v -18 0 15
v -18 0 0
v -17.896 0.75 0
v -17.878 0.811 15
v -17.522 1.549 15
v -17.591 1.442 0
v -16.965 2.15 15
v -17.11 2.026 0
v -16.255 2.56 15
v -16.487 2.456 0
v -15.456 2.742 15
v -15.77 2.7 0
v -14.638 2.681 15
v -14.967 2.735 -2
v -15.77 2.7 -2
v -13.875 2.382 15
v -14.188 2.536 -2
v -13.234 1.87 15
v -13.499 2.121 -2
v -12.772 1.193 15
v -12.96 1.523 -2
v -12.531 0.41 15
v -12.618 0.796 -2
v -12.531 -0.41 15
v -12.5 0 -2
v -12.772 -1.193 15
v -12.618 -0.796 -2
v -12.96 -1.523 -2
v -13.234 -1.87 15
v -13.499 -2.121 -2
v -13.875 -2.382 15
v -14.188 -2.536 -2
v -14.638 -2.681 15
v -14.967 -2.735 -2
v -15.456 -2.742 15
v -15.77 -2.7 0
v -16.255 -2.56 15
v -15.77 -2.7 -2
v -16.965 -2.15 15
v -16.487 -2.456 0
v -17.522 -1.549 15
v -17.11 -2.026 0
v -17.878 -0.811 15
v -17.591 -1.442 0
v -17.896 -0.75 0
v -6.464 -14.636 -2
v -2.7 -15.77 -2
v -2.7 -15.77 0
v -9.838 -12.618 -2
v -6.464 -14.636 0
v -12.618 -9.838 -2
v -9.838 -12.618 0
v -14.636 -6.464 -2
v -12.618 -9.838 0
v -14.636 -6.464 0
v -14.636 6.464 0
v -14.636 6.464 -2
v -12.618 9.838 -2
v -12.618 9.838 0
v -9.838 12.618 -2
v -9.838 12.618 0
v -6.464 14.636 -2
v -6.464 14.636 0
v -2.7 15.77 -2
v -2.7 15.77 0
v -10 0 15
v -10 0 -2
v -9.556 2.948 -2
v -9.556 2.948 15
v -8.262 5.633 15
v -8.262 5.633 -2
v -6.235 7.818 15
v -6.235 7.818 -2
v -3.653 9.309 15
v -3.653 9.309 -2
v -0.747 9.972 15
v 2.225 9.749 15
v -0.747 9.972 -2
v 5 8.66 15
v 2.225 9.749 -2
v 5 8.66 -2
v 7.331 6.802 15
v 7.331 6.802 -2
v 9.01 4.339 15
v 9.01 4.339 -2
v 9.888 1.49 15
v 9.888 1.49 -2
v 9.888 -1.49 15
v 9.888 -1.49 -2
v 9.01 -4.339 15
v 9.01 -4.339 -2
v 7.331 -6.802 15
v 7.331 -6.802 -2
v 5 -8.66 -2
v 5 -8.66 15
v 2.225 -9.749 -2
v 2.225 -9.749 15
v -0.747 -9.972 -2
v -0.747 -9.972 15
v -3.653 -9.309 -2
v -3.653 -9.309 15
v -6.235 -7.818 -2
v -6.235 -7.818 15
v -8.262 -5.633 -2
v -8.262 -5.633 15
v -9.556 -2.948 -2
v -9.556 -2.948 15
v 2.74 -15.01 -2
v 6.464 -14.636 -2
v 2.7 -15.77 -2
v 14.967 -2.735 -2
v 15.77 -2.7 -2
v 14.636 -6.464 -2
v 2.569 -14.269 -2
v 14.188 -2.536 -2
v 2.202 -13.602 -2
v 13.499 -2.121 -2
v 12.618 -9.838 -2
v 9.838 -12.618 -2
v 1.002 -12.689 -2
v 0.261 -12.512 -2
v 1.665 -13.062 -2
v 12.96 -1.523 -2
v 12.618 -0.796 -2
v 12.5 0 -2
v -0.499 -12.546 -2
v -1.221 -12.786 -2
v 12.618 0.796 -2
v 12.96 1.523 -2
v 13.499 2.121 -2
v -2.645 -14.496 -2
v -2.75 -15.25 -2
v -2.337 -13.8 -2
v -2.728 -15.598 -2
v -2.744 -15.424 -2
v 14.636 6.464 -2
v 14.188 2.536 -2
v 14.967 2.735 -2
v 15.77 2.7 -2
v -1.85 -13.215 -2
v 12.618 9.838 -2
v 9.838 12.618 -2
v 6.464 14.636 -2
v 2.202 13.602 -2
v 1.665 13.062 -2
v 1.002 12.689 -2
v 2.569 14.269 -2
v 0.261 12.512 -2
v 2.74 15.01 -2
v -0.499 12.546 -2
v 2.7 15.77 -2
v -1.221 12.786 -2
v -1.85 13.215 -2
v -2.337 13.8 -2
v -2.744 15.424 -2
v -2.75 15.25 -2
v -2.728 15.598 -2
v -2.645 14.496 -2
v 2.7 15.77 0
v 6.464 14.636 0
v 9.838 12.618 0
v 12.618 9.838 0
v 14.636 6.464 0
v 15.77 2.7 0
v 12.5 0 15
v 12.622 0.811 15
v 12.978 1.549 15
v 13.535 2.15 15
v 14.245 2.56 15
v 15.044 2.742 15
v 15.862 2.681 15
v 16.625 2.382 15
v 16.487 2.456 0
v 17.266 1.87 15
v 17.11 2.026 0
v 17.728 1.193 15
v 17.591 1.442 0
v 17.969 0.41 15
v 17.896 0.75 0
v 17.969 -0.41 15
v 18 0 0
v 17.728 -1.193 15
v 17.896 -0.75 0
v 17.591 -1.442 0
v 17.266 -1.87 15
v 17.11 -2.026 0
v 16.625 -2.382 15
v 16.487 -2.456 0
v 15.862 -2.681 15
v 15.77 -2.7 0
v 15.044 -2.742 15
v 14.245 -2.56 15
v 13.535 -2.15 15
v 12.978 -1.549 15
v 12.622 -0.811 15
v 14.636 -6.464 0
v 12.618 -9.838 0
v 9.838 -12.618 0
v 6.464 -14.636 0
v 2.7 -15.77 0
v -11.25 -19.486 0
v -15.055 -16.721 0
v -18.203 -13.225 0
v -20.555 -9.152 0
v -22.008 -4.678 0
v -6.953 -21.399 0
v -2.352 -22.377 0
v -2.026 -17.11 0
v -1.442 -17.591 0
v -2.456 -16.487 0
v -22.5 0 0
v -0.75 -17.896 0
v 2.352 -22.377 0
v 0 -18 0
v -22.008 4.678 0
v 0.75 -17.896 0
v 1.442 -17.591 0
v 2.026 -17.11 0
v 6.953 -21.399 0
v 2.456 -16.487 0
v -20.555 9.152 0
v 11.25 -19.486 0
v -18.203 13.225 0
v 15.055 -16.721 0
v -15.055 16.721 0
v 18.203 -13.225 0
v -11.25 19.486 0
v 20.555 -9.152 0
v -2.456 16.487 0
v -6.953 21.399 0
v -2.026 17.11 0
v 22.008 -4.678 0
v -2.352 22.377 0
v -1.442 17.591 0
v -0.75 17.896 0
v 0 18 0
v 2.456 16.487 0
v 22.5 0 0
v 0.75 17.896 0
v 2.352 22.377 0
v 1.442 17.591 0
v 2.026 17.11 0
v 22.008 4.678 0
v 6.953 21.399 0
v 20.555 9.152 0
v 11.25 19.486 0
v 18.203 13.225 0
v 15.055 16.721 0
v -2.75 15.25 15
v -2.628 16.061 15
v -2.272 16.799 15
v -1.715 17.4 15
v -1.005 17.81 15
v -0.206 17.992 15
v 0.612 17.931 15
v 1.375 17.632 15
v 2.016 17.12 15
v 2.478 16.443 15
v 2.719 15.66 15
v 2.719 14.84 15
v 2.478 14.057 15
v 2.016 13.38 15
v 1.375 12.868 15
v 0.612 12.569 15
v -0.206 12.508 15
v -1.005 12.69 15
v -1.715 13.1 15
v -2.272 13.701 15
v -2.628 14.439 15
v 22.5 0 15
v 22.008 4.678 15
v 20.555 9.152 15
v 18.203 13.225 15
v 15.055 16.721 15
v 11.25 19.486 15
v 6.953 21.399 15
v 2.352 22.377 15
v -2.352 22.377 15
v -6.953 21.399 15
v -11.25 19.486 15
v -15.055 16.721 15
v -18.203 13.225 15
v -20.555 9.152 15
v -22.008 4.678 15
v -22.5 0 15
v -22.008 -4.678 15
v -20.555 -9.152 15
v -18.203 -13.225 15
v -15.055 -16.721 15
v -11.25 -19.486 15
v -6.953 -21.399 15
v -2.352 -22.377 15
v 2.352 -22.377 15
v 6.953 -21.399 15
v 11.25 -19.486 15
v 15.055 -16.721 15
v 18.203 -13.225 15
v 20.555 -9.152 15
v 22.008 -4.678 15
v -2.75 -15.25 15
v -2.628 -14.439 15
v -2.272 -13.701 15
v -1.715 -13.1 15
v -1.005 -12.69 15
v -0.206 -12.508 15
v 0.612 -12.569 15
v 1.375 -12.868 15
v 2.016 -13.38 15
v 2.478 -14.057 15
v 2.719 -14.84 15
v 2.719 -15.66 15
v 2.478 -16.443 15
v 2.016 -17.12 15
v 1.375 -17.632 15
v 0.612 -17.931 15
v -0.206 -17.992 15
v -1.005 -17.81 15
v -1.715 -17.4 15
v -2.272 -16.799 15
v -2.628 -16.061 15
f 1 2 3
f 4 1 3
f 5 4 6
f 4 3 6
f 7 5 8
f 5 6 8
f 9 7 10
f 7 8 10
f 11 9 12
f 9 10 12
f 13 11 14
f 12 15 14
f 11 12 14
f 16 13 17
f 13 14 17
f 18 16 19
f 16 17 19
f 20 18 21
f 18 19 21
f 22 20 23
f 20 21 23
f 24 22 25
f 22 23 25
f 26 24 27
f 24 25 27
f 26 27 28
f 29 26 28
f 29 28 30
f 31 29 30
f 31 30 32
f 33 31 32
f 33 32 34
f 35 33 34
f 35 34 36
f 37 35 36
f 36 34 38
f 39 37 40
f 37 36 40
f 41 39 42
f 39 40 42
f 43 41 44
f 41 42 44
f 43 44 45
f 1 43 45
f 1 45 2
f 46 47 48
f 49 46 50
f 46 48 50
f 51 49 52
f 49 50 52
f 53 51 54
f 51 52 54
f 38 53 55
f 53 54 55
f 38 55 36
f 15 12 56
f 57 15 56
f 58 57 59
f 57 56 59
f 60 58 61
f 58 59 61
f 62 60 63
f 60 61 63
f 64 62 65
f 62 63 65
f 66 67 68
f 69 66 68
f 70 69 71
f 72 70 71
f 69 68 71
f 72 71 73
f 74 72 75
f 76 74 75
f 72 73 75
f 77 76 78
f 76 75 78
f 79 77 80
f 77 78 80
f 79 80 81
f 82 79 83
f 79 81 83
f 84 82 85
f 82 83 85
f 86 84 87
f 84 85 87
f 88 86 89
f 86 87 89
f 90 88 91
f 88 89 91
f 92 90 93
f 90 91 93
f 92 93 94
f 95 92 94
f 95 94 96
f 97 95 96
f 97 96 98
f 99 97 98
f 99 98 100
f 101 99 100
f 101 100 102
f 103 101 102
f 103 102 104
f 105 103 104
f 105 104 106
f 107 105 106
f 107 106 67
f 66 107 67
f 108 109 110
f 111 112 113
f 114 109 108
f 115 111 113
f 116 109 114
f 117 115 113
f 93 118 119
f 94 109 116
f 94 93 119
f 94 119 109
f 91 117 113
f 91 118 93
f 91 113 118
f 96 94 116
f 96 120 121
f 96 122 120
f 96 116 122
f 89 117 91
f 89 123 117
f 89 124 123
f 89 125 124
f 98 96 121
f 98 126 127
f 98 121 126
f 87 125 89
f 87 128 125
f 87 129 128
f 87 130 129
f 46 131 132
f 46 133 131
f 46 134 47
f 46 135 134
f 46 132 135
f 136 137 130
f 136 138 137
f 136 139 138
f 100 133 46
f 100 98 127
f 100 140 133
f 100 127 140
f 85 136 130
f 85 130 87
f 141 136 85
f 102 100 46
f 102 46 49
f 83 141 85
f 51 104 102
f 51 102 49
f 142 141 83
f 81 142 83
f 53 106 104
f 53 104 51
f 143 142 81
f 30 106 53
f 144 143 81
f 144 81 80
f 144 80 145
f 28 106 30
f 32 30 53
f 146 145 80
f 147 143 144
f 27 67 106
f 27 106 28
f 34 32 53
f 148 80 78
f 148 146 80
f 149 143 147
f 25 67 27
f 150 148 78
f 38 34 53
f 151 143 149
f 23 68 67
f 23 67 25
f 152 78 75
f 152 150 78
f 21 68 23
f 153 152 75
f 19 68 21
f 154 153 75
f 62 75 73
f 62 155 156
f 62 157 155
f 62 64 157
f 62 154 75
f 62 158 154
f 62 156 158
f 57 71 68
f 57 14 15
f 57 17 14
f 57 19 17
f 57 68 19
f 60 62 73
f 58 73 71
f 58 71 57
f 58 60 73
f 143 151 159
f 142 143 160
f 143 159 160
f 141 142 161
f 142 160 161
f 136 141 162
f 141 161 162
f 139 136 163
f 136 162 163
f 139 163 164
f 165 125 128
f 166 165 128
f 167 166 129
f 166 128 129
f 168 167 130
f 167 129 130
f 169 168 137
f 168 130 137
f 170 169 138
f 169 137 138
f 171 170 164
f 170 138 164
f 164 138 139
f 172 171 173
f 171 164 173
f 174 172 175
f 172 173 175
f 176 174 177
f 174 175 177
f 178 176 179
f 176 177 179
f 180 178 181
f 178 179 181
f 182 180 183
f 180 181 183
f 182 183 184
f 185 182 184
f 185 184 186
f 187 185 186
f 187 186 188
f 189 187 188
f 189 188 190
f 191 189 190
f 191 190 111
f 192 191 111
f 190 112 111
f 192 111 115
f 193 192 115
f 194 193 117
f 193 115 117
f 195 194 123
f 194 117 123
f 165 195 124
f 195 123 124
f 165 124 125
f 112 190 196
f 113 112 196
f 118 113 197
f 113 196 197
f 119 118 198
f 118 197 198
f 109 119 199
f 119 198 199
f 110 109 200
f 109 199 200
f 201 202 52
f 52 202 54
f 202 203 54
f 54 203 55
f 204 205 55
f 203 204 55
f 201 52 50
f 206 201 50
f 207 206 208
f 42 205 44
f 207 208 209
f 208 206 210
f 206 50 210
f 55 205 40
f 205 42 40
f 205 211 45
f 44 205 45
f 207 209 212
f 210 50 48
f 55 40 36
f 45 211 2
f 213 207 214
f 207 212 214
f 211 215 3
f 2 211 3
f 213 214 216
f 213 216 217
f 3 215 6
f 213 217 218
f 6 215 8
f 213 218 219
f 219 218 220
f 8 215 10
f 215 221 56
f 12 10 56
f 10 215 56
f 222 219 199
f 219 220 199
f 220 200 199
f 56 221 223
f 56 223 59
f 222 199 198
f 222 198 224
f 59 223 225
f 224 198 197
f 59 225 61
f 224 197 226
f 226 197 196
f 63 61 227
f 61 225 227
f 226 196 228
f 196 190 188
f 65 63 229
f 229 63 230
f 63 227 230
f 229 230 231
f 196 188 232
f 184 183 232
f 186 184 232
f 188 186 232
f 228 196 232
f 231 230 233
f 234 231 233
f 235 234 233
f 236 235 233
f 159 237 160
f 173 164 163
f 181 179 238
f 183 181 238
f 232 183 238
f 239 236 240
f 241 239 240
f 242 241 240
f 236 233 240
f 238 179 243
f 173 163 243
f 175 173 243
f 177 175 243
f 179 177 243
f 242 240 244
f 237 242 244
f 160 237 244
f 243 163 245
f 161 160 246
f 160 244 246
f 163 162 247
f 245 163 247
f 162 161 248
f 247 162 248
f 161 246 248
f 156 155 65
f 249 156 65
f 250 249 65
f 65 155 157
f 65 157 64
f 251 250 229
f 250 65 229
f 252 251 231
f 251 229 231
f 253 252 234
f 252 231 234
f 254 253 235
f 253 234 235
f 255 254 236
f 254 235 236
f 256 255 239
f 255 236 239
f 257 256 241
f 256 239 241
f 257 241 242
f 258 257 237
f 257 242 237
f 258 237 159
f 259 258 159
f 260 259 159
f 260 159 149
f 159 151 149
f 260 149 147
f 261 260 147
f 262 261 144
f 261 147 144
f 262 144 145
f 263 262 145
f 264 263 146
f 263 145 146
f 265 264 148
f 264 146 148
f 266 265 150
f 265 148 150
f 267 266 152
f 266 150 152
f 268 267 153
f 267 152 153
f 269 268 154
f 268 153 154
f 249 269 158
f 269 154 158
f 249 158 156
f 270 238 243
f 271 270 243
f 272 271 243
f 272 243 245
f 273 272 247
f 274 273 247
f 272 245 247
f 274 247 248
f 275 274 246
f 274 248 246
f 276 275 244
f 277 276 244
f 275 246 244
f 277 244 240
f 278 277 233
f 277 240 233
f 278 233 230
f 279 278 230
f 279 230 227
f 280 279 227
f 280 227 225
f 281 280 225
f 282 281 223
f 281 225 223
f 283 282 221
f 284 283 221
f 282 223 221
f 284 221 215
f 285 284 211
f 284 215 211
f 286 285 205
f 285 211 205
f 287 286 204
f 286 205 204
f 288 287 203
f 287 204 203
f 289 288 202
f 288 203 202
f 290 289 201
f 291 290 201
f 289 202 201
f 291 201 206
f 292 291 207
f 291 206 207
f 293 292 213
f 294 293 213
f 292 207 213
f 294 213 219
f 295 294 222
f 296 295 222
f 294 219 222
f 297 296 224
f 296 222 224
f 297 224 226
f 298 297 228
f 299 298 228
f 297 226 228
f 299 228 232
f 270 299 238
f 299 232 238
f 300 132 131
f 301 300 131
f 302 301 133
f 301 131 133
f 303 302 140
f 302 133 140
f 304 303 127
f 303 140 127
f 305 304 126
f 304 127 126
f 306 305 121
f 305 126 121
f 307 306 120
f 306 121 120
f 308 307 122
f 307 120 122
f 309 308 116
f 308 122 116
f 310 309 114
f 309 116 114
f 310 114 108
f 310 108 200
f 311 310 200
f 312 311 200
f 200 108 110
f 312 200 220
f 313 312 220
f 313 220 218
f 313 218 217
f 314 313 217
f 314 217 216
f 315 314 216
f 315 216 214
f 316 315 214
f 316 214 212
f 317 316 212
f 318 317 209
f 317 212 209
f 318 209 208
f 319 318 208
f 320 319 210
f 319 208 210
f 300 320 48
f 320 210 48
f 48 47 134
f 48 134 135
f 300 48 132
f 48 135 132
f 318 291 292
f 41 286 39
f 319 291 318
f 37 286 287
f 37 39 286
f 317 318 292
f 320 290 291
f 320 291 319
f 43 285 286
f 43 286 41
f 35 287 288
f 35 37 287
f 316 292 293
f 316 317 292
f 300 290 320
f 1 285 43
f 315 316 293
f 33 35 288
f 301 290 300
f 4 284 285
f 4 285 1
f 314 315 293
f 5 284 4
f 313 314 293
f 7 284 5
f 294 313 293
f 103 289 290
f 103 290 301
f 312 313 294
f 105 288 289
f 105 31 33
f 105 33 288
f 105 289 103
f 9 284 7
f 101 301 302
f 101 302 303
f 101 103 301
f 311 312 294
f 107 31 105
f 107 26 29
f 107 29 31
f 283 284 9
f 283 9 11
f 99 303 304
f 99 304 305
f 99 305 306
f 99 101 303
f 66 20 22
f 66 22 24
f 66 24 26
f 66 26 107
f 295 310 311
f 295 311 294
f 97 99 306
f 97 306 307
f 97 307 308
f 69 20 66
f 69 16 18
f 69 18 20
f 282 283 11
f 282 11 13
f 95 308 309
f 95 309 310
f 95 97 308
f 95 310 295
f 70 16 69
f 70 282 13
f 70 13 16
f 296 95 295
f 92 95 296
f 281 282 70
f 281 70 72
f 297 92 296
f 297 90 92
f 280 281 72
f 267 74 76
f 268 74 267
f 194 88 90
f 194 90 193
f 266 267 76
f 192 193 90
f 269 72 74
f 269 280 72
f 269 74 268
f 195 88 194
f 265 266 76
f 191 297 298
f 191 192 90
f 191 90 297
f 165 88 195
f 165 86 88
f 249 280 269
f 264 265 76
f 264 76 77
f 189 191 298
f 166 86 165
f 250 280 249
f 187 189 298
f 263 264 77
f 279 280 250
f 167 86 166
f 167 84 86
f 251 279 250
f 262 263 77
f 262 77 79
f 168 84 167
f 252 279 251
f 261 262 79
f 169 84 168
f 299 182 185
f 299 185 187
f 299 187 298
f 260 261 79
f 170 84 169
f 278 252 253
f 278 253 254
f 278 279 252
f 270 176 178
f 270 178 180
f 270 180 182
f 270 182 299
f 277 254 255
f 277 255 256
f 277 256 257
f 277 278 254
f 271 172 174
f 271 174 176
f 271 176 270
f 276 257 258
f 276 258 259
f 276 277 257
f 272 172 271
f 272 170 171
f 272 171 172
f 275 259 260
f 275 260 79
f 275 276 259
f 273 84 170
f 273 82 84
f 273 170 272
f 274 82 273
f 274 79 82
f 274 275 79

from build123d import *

# Parameters (mm, degrees)
SKIZZE1_R                       = 22.5
AUFSATZ_LINEAR_AUSTRAGEN1_DEPTH = 15
SKIZZE2_R                       = 16
AUFSATZ_LINEAR_AUSTRAGEN2_DEPTH = 2
SKIZZE3_R                       = 10
SCHNITT_LINEAR_AUSTRAGEN1_DEPTH = 37.076308015
SKIZZE7_R                       = 2.75
SCHNITT_LINEAR_AUSTRAGEN2_DEPTH = 37.076308015


with BuildPart() as part:
    # Skizze1 → Aufsatz-Linear austragen1 (new body)
    with BuildSketch(Plane.XY):
        Circle(SKIZZE1_R)
    extrude(amount=AUFSATZ_LINEAR_AUSTRAGEN1_DEPTH)

    # Skizze2 → Aufsatz-Linear austragen2 (add)
    with BuildSketch(Plane(origin=(0, 0, 0), x_dir=(-1, 0, 0), z_dir=(0, 0, -1))):
        Circle(SKIZZE2_R)
    extrude(amount=AUFSATZ_LINEAR_AUSTRAGEN2_DEPTH)

    # Skizze3 → Schnitt-Linear austragen1 (cut, through all)
    with BuildSketch(Plane(origin=(0, 0, -2), x_dir=(-1, 0, 0), z_dir=(0, 0, -1))):
        Circle(SKIZZE3_R)
    extrude(amount=-SCHNITT_LINEAR_AUSTRAGEN1_DEPTH, mode=Mode.SUBTRACT)

    # Skizze7 → Schnitt-Linear austragen2 (cut, through all)
    with BuildSketch(Plane(origin=(0, 0, -2), x_dir=(-1, 0, 0), z_dir=(0, 0, -1))):
        with Locations((0, 15.25)):
            Circle(SKIZZE7_R)
        with Locations((15.25, 0)):
            Circle(SKIZZE7_R)
        with Locations((0, -15.25)):
            Circle(SKIZZE7_R)
        with Locations((-15.25, 0)):
            Circle(SKIZZE7_R)
    extrude(amount=-SCHNITT_LINEAR_AUSTRAGEN2_DEPTH, mode=Mode.SUBTRACT)


solid = part.part
